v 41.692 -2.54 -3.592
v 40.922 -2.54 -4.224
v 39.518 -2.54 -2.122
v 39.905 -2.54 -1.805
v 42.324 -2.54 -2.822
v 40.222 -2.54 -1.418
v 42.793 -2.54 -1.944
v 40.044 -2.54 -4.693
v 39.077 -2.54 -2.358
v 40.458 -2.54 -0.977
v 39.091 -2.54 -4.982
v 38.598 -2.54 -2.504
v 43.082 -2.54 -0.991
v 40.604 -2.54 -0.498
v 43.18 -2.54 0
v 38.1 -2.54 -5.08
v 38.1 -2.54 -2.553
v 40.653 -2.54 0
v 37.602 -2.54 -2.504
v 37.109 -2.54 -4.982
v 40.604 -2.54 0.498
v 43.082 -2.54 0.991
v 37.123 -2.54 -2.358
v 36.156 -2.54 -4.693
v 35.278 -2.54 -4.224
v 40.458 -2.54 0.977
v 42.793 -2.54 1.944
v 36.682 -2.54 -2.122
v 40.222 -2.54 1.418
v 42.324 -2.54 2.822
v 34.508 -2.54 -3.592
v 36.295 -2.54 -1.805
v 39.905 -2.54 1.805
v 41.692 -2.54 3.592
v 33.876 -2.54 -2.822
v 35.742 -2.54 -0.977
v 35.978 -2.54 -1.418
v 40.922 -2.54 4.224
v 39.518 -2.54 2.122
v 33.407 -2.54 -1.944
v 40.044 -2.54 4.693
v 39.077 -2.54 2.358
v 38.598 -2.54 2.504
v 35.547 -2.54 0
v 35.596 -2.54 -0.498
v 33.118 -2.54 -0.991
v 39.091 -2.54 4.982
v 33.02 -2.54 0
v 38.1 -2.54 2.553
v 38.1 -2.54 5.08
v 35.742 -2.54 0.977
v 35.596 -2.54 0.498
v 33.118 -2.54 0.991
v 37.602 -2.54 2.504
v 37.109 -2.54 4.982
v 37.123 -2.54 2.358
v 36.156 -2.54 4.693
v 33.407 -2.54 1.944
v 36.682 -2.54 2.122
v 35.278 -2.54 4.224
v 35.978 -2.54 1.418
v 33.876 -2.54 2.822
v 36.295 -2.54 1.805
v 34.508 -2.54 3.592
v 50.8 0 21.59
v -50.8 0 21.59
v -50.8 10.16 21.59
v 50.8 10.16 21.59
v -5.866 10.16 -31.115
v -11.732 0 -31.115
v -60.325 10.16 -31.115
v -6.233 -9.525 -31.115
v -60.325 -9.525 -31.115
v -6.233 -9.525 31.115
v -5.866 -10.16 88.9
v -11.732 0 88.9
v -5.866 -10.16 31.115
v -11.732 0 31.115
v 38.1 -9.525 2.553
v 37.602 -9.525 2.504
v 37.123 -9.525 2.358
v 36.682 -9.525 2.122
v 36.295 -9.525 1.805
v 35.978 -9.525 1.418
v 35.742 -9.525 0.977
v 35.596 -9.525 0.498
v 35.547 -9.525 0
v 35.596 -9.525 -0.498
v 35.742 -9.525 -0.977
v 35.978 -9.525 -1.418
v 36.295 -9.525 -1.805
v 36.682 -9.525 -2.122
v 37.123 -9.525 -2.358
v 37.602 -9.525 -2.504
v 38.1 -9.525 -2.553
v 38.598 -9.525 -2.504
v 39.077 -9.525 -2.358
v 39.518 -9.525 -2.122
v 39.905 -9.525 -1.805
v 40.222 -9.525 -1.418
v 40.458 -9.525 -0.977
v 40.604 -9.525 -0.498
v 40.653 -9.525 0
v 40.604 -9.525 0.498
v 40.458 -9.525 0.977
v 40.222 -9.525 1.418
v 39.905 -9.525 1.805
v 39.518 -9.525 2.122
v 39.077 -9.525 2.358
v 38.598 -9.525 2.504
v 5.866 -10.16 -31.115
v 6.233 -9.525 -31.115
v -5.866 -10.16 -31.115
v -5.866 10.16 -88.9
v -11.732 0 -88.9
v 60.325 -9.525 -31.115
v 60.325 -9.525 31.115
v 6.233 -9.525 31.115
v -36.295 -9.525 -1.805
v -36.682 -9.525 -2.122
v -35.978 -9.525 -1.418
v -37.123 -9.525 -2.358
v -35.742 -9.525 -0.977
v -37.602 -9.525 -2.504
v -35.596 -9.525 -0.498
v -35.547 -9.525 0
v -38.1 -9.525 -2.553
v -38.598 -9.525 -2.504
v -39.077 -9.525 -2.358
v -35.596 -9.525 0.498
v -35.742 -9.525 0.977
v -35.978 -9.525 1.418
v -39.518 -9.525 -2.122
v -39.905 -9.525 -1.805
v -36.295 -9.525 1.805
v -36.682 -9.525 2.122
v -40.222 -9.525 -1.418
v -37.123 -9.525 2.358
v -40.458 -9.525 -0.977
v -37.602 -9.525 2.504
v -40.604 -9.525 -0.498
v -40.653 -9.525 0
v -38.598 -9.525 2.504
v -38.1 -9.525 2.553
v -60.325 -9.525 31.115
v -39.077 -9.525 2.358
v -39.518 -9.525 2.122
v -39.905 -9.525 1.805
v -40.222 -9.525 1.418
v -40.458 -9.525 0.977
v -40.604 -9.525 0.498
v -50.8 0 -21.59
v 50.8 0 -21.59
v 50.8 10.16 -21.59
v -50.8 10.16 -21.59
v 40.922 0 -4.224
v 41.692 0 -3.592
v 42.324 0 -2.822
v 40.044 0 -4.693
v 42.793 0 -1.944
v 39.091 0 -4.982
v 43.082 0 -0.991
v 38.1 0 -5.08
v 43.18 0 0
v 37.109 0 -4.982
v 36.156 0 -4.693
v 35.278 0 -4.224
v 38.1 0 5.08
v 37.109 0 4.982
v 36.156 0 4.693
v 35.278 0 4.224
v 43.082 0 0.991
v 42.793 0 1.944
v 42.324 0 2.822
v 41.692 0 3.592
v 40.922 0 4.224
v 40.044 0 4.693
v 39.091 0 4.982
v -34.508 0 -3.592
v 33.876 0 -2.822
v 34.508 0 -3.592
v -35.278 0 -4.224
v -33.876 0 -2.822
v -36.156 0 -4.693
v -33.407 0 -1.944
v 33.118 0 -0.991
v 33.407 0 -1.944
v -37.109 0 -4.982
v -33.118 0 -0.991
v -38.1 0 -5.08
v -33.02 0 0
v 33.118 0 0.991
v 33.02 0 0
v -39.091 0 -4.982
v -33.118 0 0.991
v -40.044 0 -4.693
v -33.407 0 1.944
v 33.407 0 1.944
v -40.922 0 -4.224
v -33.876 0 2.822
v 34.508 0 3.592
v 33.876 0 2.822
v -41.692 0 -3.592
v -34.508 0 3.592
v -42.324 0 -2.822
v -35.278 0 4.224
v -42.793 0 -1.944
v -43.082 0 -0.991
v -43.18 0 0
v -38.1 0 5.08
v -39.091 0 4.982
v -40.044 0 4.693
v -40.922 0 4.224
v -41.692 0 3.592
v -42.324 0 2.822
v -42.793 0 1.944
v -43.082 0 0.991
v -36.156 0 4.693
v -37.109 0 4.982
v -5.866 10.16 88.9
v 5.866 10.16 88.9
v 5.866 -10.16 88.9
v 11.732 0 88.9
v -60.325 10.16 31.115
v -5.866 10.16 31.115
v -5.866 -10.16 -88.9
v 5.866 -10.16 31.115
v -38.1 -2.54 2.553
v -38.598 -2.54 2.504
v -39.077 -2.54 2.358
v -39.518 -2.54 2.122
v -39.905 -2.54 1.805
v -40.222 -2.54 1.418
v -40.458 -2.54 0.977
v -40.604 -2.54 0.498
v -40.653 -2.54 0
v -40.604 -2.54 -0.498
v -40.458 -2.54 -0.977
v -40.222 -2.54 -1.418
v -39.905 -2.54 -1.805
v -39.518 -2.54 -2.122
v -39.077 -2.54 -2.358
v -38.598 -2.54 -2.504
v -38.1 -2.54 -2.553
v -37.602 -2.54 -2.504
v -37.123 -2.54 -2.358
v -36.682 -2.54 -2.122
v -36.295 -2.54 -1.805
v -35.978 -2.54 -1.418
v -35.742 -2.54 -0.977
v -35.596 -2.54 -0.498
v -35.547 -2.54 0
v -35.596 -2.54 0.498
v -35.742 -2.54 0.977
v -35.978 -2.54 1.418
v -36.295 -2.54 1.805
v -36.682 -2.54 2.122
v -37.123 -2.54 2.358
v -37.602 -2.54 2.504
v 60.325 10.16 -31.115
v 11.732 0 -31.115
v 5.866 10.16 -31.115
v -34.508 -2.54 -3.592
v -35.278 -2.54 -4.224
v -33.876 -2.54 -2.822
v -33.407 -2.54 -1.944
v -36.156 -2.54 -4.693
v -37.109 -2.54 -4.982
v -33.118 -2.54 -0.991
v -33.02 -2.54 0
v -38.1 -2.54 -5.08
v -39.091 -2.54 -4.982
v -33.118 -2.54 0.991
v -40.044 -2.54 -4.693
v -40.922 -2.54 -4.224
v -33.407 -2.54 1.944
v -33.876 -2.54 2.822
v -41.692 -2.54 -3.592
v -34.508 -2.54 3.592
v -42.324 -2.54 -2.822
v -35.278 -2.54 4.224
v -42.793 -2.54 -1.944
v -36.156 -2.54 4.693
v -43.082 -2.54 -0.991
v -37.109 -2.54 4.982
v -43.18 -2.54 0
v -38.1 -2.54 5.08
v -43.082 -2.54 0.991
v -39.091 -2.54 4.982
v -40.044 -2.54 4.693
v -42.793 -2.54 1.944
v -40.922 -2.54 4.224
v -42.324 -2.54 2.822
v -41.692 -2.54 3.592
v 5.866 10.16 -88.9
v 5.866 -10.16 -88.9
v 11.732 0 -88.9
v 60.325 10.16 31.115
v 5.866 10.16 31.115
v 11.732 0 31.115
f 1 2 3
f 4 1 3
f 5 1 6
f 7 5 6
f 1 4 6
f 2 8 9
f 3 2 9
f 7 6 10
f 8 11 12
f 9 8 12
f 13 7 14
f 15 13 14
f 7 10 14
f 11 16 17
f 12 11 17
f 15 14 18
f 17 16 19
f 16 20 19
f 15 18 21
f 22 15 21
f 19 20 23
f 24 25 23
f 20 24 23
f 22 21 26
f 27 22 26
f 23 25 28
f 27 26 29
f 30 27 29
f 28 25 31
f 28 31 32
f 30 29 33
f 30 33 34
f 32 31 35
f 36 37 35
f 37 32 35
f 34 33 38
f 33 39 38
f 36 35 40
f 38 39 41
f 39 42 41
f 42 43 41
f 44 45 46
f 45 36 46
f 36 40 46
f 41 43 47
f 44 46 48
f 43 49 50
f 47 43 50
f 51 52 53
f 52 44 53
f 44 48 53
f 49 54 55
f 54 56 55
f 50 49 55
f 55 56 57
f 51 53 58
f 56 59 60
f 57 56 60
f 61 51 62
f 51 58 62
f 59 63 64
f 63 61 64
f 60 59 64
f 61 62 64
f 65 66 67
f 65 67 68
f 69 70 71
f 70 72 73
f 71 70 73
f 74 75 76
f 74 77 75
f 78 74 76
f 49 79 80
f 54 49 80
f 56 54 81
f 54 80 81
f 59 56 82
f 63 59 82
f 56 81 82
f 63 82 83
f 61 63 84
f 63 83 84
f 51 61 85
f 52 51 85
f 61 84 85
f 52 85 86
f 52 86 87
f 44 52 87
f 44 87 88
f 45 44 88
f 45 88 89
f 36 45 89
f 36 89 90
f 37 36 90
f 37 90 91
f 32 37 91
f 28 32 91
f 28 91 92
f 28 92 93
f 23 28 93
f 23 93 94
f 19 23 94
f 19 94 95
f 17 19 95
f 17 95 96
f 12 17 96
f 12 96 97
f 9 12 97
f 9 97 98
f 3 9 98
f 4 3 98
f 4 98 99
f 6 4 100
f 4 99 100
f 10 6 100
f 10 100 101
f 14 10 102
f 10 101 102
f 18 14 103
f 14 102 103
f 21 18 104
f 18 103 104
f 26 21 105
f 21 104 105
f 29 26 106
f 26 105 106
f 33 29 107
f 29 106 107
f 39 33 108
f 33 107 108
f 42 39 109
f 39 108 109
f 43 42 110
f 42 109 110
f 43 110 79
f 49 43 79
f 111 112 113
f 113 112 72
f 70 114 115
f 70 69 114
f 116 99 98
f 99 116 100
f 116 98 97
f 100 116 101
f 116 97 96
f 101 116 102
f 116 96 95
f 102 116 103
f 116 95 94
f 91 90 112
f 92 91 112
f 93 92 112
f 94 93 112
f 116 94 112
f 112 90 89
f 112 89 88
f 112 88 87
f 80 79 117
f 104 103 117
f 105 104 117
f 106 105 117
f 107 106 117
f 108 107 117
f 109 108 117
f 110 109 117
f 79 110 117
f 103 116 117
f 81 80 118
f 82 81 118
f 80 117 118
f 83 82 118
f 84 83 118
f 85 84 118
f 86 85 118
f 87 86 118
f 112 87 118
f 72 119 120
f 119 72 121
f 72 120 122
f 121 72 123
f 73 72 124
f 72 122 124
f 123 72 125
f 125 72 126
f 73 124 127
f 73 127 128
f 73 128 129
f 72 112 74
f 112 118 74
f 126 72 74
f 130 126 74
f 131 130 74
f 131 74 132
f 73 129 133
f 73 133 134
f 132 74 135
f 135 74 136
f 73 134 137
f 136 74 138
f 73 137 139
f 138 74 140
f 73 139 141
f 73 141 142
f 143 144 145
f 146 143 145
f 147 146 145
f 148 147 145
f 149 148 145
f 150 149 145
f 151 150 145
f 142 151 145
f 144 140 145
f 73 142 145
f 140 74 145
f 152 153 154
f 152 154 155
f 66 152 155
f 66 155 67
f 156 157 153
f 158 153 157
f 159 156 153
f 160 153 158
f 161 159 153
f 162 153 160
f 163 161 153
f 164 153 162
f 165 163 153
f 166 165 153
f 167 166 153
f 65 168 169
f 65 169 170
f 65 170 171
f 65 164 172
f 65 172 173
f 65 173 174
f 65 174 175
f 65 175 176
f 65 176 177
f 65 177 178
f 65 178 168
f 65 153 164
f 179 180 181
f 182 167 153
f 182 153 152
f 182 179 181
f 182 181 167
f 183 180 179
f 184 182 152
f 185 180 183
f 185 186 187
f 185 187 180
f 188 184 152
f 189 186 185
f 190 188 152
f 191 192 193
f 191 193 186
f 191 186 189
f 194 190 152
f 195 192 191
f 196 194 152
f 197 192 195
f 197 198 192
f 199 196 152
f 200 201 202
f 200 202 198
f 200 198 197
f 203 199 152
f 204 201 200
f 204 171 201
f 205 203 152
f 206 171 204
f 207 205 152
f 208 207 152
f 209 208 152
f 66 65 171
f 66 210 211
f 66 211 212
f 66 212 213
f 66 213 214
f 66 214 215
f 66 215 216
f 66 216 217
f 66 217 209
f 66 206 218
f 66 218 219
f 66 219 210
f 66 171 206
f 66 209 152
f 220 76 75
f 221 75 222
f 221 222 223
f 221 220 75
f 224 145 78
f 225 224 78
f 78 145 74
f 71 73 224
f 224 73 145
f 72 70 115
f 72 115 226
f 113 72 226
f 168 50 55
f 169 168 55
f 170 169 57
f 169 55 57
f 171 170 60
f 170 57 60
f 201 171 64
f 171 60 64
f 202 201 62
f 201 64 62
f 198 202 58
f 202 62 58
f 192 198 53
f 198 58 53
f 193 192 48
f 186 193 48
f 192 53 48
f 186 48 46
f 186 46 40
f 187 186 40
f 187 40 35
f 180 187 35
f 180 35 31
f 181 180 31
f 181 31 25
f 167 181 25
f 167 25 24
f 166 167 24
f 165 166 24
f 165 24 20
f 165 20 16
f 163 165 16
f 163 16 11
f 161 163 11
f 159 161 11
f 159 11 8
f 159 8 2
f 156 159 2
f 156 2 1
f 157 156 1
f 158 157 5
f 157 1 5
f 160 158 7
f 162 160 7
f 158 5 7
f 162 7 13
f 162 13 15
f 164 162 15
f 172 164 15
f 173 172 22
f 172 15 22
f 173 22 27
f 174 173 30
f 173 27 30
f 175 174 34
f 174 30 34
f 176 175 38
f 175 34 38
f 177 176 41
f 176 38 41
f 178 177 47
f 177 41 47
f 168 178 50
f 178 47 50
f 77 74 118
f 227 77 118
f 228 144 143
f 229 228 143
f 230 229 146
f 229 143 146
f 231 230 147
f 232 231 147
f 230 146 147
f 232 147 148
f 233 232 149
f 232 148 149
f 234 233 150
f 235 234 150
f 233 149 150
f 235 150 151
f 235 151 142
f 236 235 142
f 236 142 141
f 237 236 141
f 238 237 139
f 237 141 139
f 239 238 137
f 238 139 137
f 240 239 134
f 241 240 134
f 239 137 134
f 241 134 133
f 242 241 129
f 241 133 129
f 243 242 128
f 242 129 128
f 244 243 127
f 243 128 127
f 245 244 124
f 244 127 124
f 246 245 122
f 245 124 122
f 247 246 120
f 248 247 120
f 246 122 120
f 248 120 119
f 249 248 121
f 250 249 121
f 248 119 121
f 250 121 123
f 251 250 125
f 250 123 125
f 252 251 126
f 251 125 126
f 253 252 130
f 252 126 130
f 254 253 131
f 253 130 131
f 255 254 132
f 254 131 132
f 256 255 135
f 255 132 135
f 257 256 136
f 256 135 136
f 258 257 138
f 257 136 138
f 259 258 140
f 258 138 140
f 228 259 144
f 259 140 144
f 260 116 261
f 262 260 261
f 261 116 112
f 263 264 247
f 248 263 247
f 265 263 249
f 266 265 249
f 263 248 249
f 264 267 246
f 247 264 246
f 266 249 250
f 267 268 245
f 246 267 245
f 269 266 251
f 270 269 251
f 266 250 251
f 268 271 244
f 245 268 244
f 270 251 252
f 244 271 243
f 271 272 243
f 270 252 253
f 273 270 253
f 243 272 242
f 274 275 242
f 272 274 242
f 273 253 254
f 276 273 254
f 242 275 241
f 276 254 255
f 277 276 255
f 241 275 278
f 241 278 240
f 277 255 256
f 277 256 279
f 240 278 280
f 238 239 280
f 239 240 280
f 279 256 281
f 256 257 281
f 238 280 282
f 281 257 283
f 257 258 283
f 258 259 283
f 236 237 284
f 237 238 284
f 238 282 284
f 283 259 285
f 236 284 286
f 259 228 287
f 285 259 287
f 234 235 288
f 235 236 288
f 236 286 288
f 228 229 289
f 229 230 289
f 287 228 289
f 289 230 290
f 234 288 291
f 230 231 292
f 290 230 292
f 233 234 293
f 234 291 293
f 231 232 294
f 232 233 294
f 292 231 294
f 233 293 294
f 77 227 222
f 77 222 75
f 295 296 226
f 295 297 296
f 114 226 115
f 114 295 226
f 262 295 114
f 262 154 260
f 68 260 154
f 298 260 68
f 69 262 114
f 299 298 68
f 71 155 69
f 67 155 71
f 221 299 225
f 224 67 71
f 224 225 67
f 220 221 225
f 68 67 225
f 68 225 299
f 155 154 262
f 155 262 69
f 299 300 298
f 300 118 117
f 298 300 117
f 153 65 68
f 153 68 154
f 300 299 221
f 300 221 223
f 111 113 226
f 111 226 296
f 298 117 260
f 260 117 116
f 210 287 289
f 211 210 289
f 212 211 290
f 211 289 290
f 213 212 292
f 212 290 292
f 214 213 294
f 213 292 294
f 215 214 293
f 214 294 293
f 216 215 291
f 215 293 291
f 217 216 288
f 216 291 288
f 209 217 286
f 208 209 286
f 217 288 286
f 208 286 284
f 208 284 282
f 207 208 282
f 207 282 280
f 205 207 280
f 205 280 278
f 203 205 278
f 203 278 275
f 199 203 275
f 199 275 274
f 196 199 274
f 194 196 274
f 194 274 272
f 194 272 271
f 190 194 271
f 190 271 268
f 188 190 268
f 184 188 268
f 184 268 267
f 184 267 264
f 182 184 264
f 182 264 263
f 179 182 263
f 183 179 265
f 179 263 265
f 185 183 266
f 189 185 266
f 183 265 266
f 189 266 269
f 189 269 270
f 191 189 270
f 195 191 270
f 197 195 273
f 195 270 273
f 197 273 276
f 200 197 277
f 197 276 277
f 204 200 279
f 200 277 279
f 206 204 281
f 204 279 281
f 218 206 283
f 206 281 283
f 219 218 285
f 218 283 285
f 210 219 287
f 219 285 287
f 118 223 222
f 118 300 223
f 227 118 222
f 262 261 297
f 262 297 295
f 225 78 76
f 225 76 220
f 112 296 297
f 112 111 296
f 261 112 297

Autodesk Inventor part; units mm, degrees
ref_plane "YZ Plane" through (0, 0, 0) normal (1, 0, 0) x (0, 1, 0)
ref_plane "XZ Plane" through (0, 0, 0) normal (0, 1, 0) x (-1, 0, 0)
sketch "Sketch1" plane through (0, 0, 0) normal (0, 1, 0) x (-1, 0, 0)
  line L0 (50.8, 21.59) -> (-50.8, 21.59)
  line L1 (-50.8, 21.59) -> (-50.8, -21.59)
  line L2 (-50.8, -21.59) -> (50.8, -21.59)
  line L3 (50.8, -21.59) -> (50.8, 21.59)
  line L4 (50.8, 21.59) -> (-50.8, -21.59) construction
  line L5 (-50.8, 21.59) -> (50.8, -21.59) construction
  line L6 (60.325, 31.115) -> (-60.325, 31.115)
  line L7 (-60.325, 31.115) -> (-60.325, -31.115)
  line L8 (-60.325, -31.115) -> (60.325, -31.115)
  line L9 (60.325, -31.115) -> (60.325, 31.115)
  line L10 (60.325, 31.115) -> (-60.325, -31.115) construction
  line L11 (-60.325, 31.115) -> (60.325, -31.115) construction
  point P0 (0, 0)
extrude "Extrusion1" add sketch "Sketch1" against normal blind 9.525 contours L3 L2 L1 L0 | L9 L8 L7 L6
extrude "Extrusion2" add sketch "Sketch1" along normal blind 10.16
sketch "Sketch5" plane through (0, 0, 0) normal (0, 1, 0) x (1, 0, 0)
  line L0 (-50.8, 21.59) -> (-50.8, -21.59) projected
  line L1 (50.8, -21.59) -> (50.8, 21.59) projected
  point P0 (0, 0)
  point P1 (-38.1, 0)
  point P2 (38.1, 0)
  dimension "postHoleCenter" = 12.7
  dimension "d16" = 12.7
hole "Hole1" at (-38.1, 0, 0) at (38.1, 0, 0) direction (0, -1, 0) diameter 5.1054 end through all counterbore diameter 10.16 counterbore depth 2.54 clearance for "Hex Machine Screw" size "#10" standard "Ansi Unified Screw Threads"
sketch "Sketch6" plane through (-60.325, -9.525, 31.115) normal (0, 0, 1) x (1, 0, 0)
  line L0 (0, 19.685) -> (120.65, 19.685) projected
  line L1 (66.1909, 19.685) -> (72.0568, 9.525)
  line L2 (72.0568, 9.525) -> (66.1909, -0.635)
  line L3 (66.1909, -0.635) -> (54.4591, -0.635)
  line L4 (54.4591, -0.635) -> (48.5932, 9.525)
  line L5 (48.5932, 9.525) -> (54.4591, 19.685)
  line L6 (54.4591, 19.685) -> (66.1909, 19.685)
  point P0 (60.325, 9.525)
  point P1 (60.325, 9.525)
extrude "Extrusion5" add sketch "Sketch6" along normal blind 57.785
mirror "Mirror2" about plane through (0, 0, 0) normal (0, 0, 1) of "Extrusion5"
equation "\"d4\" = wallThickness"
equation "\"d16\" = postHoleCenter"
equation "\"d25\" = hexExtensionLength"
equation "\"wallThickness\" = 9.525"
equation "\"outerWidth\" = innerWidth + 2 * wallThickness"
equation "\"outerLength\" = innerLength + 2 * wallThickness"
equation "\"outerHeight\" = innerDepth + wallThickness"
equation "\"shortenForTestPrint\" = 76.2"
equation "\"hexExtensionLength\" = -0.5 * outerWidth + 0.5 * maxWidth"
equation "\"maxWidth\" = 177.8"
equation "\"innerWidth\" = 43.18"
equation "\"innerLength\" = 101.6"
equation "\"innerDepth\" = 10.16"
properties part number "connectorToTubeBracketWithHexShaft"
